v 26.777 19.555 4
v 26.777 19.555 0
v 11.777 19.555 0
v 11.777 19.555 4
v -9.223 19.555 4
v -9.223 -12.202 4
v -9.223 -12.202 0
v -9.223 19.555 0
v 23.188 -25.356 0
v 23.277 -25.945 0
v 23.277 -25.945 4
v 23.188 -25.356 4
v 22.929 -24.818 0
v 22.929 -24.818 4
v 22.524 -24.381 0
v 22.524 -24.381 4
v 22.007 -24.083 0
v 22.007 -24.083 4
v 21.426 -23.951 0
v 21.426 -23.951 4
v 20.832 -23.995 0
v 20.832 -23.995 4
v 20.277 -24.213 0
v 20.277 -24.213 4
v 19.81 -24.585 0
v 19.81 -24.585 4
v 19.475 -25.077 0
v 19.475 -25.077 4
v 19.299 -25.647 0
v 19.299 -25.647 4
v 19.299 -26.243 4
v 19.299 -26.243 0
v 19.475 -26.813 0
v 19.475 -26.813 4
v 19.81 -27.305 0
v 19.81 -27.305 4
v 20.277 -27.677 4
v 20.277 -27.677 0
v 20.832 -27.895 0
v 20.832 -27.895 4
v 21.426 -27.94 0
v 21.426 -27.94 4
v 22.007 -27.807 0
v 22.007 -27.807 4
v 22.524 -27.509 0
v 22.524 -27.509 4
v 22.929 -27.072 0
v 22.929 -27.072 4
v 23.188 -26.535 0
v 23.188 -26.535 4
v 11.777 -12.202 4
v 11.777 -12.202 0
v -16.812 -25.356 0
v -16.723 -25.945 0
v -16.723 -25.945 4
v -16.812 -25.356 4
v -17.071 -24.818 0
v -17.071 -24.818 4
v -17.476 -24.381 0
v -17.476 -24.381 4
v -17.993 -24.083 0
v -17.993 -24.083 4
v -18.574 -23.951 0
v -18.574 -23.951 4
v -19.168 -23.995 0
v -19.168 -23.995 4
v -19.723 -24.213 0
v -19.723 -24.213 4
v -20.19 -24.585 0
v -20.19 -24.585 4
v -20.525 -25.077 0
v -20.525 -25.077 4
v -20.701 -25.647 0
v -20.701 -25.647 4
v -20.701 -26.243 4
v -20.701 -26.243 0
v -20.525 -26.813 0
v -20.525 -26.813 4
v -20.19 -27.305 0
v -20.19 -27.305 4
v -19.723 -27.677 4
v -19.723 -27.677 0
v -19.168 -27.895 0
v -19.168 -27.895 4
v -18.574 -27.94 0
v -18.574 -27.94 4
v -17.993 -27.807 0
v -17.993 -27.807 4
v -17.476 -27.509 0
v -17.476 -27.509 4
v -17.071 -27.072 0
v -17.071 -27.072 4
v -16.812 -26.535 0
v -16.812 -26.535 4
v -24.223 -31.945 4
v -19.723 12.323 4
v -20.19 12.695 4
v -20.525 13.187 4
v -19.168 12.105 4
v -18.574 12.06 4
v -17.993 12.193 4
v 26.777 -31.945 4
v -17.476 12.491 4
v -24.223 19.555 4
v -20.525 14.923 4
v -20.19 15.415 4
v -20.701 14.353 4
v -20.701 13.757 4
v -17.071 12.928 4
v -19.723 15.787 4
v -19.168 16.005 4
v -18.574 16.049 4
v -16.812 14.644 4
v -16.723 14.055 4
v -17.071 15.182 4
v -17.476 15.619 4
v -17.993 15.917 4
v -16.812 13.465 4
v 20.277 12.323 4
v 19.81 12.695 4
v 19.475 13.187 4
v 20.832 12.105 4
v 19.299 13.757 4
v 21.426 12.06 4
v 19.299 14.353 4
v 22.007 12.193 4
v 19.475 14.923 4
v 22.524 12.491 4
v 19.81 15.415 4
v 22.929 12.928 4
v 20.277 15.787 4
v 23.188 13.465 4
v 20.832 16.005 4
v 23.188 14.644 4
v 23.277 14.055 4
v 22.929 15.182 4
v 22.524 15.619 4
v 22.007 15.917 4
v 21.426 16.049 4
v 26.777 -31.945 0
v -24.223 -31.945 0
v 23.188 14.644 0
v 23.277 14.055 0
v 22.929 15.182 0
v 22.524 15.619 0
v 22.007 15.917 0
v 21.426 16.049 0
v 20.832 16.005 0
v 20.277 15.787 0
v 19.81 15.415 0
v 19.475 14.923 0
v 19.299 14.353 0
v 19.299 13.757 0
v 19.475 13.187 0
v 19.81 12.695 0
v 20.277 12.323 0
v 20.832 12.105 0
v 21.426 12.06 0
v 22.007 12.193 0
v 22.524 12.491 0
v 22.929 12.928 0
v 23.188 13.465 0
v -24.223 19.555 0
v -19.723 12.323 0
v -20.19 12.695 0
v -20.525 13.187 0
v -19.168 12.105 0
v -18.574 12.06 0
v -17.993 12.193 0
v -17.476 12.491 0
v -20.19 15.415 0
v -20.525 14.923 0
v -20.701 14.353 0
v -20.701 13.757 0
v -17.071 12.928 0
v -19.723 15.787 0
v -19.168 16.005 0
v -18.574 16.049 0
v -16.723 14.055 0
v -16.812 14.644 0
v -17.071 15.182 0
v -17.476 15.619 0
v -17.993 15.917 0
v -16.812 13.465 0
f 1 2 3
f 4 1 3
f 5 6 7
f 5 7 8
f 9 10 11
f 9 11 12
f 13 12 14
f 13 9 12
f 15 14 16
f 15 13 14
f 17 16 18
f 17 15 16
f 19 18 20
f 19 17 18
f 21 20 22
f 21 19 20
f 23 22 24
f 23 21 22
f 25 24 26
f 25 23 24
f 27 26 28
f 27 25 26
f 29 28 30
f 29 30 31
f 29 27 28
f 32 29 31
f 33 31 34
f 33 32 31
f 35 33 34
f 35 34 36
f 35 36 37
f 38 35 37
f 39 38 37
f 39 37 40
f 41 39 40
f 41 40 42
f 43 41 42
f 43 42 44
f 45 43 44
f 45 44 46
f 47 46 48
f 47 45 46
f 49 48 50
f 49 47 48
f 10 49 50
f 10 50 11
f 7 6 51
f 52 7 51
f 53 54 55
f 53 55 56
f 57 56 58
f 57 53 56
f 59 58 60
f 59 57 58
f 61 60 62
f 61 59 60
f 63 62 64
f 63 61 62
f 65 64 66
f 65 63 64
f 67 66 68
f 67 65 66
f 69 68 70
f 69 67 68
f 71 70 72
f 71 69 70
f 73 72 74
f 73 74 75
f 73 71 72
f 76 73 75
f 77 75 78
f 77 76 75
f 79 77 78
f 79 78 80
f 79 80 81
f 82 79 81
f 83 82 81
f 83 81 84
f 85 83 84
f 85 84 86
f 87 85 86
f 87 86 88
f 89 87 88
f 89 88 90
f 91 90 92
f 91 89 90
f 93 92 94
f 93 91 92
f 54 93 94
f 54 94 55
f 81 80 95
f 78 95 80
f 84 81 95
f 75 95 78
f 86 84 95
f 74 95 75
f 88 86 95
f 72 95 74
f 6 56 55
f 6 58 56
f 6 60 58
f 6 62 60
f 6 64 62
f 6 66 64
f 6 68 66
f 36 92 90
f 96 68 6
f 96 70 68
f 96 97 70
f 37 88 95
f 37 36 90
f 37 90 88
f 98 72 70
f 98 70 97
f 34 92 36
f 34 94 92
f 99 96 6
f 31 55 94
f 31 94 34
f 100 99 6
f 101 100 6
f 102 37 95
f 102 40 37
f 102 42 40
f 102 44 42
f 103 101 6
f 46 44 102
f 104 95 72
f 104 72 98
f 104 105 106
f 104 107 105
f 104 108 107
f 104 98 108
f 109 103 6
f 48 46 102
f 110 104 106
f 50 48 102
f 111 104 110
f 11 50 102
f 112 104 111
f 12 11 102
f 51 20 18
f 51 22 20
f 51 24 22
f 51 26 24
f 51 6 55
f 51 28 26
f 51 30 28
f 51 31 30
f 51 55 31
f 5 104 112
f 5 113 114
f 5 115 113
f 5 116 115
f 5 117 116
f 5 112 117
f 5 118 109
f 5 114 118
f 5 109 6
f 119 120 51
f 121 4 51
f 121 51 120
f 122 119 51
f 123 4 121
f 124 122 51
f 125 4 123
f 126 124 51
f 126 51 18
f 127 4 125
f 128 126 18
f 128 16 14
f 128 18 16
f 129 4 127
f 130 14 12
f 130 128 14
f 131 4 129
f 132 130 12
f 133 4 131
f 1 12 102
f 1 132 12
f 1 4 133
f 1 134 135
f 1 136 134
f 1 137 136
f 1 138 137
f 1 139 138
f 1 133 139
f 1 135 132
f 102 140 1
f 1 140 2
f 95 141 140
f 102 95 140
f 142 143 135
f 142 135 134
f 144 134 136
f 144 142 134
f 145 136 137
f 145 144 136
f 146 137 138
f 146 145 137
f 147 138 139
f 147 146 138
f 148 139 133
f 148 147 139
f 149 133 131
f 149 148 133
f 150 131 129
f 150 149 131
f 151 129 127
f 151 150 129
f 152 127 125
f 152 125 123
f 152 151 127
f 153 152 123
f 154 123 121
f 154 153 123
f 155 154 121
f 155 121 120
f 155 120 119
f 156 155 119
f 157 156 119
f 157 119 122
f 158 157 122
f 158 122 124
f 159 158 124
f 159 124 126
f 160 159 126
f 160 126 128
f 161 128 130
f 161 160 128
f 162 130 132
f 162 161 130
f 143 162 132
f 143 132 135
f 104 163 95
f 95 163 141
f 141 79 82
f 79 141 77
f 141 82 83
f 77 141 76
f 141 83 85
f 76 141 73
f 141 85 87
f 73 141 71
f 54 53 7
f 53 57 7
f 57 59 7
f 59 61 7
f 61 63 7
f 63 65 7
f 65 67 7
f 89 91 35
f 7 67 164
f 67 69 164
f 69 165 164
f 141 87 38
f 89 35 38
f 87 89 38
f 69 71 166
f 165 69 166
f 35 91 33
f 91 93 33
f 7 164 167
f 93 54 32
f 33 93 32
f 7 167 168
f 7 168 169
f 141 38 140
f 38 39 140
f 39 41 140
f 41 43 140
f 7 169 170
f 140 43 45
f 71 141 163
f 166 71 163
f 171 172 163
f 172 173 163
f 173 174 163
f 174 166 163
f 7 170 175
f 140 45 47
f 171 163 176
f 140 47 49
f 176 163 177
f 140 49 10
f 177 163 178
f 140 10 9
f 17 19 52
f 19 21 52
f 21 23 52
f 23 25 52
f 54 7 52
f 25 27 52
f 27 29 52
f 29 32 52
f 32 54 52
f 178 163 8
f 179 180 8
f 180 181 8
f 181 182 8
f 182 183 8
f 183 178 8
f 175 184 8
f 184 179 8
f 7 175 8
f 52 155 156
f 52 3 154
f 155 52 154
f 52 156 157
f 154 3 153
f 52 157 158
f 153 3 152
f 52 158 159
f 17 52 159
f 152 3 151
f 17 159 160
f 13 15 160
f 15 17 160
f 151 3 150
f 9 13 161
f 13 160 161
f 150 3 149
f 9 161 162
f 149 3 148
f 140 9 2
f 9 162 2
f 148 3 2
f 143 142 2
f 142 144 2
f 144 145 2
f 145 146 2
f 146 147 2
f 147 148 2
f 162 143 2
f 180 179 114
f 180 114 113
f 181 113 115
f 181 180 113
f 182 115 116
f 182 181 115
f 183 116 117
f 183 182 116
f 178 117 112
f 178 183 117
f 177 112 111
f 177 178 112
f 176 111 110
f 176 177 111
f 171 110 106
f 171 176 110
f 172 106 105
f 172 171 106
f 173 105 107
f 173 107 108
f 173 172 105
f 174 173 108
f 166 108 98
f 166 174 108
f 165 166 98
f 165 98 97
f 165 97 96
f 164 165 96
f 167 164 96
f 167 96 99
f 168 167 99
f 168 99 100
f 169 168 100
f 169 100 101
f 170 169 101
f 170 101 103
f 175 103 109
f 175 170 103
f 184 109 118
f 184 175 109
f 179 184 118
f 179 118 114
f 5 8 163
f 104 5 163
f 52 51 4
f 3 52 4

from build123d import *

# Parameters (mm, degrees)
SKETCH_1_R          = 2
EXTRUDE_1_DEPTH     = 4
SKETCH_2_W          = 21
SKETCH_2_H          = 31.756996305
CUT_EXTRUDE_1_DEPTH = 4


with BuildPart() as part:
    # 草图1 → 凸台-拉伸1 (new body)
    with BuildSketch(Plane.XY):
        Polygon((-24.223404255, 19.554868645), (-24.223404255, -31.445131355), (-24.223404255, -31.945131355), (26.776595745, -31.945131355), (26.776595745, -31.445131355), (26.776595745, 19.554868645), align=None)
        with Locations((-18.723404255, -25.945131355)):
            Circle(SKETCH_1_R, mode=Mode.SUBTRACT)
        with Locations((21.276595745, -25.945131355)):
            Circle(SKETCH_1_R, mode=Mode.SUBTRACT)
        with Locations((-18.723404255, 14.054868645)):
            Circle(SKETCH_1_R, mode=Mode.SUBTRACT)
        with Locations((21.276595745, 14.054868645)):
            Circle(SKETCH_1_R, mode=Mode.SUBTRACT)
    extrude(amount=EXTRUDE_1_DEPTH)

    # 草图2 → 切除-拉伸1 (cut)
    with BuildSketch(Plane.XY.offset(4)):
        with Locations((1.276595745, 3.676370493)):
            Rectangle(SKETCH_2_W, SKETCH_2_H)
    extrude(amount=-CUT_EXTRUDE_1_DEPTH, mode=Mode.SUBTRACT)


solid = part.part
